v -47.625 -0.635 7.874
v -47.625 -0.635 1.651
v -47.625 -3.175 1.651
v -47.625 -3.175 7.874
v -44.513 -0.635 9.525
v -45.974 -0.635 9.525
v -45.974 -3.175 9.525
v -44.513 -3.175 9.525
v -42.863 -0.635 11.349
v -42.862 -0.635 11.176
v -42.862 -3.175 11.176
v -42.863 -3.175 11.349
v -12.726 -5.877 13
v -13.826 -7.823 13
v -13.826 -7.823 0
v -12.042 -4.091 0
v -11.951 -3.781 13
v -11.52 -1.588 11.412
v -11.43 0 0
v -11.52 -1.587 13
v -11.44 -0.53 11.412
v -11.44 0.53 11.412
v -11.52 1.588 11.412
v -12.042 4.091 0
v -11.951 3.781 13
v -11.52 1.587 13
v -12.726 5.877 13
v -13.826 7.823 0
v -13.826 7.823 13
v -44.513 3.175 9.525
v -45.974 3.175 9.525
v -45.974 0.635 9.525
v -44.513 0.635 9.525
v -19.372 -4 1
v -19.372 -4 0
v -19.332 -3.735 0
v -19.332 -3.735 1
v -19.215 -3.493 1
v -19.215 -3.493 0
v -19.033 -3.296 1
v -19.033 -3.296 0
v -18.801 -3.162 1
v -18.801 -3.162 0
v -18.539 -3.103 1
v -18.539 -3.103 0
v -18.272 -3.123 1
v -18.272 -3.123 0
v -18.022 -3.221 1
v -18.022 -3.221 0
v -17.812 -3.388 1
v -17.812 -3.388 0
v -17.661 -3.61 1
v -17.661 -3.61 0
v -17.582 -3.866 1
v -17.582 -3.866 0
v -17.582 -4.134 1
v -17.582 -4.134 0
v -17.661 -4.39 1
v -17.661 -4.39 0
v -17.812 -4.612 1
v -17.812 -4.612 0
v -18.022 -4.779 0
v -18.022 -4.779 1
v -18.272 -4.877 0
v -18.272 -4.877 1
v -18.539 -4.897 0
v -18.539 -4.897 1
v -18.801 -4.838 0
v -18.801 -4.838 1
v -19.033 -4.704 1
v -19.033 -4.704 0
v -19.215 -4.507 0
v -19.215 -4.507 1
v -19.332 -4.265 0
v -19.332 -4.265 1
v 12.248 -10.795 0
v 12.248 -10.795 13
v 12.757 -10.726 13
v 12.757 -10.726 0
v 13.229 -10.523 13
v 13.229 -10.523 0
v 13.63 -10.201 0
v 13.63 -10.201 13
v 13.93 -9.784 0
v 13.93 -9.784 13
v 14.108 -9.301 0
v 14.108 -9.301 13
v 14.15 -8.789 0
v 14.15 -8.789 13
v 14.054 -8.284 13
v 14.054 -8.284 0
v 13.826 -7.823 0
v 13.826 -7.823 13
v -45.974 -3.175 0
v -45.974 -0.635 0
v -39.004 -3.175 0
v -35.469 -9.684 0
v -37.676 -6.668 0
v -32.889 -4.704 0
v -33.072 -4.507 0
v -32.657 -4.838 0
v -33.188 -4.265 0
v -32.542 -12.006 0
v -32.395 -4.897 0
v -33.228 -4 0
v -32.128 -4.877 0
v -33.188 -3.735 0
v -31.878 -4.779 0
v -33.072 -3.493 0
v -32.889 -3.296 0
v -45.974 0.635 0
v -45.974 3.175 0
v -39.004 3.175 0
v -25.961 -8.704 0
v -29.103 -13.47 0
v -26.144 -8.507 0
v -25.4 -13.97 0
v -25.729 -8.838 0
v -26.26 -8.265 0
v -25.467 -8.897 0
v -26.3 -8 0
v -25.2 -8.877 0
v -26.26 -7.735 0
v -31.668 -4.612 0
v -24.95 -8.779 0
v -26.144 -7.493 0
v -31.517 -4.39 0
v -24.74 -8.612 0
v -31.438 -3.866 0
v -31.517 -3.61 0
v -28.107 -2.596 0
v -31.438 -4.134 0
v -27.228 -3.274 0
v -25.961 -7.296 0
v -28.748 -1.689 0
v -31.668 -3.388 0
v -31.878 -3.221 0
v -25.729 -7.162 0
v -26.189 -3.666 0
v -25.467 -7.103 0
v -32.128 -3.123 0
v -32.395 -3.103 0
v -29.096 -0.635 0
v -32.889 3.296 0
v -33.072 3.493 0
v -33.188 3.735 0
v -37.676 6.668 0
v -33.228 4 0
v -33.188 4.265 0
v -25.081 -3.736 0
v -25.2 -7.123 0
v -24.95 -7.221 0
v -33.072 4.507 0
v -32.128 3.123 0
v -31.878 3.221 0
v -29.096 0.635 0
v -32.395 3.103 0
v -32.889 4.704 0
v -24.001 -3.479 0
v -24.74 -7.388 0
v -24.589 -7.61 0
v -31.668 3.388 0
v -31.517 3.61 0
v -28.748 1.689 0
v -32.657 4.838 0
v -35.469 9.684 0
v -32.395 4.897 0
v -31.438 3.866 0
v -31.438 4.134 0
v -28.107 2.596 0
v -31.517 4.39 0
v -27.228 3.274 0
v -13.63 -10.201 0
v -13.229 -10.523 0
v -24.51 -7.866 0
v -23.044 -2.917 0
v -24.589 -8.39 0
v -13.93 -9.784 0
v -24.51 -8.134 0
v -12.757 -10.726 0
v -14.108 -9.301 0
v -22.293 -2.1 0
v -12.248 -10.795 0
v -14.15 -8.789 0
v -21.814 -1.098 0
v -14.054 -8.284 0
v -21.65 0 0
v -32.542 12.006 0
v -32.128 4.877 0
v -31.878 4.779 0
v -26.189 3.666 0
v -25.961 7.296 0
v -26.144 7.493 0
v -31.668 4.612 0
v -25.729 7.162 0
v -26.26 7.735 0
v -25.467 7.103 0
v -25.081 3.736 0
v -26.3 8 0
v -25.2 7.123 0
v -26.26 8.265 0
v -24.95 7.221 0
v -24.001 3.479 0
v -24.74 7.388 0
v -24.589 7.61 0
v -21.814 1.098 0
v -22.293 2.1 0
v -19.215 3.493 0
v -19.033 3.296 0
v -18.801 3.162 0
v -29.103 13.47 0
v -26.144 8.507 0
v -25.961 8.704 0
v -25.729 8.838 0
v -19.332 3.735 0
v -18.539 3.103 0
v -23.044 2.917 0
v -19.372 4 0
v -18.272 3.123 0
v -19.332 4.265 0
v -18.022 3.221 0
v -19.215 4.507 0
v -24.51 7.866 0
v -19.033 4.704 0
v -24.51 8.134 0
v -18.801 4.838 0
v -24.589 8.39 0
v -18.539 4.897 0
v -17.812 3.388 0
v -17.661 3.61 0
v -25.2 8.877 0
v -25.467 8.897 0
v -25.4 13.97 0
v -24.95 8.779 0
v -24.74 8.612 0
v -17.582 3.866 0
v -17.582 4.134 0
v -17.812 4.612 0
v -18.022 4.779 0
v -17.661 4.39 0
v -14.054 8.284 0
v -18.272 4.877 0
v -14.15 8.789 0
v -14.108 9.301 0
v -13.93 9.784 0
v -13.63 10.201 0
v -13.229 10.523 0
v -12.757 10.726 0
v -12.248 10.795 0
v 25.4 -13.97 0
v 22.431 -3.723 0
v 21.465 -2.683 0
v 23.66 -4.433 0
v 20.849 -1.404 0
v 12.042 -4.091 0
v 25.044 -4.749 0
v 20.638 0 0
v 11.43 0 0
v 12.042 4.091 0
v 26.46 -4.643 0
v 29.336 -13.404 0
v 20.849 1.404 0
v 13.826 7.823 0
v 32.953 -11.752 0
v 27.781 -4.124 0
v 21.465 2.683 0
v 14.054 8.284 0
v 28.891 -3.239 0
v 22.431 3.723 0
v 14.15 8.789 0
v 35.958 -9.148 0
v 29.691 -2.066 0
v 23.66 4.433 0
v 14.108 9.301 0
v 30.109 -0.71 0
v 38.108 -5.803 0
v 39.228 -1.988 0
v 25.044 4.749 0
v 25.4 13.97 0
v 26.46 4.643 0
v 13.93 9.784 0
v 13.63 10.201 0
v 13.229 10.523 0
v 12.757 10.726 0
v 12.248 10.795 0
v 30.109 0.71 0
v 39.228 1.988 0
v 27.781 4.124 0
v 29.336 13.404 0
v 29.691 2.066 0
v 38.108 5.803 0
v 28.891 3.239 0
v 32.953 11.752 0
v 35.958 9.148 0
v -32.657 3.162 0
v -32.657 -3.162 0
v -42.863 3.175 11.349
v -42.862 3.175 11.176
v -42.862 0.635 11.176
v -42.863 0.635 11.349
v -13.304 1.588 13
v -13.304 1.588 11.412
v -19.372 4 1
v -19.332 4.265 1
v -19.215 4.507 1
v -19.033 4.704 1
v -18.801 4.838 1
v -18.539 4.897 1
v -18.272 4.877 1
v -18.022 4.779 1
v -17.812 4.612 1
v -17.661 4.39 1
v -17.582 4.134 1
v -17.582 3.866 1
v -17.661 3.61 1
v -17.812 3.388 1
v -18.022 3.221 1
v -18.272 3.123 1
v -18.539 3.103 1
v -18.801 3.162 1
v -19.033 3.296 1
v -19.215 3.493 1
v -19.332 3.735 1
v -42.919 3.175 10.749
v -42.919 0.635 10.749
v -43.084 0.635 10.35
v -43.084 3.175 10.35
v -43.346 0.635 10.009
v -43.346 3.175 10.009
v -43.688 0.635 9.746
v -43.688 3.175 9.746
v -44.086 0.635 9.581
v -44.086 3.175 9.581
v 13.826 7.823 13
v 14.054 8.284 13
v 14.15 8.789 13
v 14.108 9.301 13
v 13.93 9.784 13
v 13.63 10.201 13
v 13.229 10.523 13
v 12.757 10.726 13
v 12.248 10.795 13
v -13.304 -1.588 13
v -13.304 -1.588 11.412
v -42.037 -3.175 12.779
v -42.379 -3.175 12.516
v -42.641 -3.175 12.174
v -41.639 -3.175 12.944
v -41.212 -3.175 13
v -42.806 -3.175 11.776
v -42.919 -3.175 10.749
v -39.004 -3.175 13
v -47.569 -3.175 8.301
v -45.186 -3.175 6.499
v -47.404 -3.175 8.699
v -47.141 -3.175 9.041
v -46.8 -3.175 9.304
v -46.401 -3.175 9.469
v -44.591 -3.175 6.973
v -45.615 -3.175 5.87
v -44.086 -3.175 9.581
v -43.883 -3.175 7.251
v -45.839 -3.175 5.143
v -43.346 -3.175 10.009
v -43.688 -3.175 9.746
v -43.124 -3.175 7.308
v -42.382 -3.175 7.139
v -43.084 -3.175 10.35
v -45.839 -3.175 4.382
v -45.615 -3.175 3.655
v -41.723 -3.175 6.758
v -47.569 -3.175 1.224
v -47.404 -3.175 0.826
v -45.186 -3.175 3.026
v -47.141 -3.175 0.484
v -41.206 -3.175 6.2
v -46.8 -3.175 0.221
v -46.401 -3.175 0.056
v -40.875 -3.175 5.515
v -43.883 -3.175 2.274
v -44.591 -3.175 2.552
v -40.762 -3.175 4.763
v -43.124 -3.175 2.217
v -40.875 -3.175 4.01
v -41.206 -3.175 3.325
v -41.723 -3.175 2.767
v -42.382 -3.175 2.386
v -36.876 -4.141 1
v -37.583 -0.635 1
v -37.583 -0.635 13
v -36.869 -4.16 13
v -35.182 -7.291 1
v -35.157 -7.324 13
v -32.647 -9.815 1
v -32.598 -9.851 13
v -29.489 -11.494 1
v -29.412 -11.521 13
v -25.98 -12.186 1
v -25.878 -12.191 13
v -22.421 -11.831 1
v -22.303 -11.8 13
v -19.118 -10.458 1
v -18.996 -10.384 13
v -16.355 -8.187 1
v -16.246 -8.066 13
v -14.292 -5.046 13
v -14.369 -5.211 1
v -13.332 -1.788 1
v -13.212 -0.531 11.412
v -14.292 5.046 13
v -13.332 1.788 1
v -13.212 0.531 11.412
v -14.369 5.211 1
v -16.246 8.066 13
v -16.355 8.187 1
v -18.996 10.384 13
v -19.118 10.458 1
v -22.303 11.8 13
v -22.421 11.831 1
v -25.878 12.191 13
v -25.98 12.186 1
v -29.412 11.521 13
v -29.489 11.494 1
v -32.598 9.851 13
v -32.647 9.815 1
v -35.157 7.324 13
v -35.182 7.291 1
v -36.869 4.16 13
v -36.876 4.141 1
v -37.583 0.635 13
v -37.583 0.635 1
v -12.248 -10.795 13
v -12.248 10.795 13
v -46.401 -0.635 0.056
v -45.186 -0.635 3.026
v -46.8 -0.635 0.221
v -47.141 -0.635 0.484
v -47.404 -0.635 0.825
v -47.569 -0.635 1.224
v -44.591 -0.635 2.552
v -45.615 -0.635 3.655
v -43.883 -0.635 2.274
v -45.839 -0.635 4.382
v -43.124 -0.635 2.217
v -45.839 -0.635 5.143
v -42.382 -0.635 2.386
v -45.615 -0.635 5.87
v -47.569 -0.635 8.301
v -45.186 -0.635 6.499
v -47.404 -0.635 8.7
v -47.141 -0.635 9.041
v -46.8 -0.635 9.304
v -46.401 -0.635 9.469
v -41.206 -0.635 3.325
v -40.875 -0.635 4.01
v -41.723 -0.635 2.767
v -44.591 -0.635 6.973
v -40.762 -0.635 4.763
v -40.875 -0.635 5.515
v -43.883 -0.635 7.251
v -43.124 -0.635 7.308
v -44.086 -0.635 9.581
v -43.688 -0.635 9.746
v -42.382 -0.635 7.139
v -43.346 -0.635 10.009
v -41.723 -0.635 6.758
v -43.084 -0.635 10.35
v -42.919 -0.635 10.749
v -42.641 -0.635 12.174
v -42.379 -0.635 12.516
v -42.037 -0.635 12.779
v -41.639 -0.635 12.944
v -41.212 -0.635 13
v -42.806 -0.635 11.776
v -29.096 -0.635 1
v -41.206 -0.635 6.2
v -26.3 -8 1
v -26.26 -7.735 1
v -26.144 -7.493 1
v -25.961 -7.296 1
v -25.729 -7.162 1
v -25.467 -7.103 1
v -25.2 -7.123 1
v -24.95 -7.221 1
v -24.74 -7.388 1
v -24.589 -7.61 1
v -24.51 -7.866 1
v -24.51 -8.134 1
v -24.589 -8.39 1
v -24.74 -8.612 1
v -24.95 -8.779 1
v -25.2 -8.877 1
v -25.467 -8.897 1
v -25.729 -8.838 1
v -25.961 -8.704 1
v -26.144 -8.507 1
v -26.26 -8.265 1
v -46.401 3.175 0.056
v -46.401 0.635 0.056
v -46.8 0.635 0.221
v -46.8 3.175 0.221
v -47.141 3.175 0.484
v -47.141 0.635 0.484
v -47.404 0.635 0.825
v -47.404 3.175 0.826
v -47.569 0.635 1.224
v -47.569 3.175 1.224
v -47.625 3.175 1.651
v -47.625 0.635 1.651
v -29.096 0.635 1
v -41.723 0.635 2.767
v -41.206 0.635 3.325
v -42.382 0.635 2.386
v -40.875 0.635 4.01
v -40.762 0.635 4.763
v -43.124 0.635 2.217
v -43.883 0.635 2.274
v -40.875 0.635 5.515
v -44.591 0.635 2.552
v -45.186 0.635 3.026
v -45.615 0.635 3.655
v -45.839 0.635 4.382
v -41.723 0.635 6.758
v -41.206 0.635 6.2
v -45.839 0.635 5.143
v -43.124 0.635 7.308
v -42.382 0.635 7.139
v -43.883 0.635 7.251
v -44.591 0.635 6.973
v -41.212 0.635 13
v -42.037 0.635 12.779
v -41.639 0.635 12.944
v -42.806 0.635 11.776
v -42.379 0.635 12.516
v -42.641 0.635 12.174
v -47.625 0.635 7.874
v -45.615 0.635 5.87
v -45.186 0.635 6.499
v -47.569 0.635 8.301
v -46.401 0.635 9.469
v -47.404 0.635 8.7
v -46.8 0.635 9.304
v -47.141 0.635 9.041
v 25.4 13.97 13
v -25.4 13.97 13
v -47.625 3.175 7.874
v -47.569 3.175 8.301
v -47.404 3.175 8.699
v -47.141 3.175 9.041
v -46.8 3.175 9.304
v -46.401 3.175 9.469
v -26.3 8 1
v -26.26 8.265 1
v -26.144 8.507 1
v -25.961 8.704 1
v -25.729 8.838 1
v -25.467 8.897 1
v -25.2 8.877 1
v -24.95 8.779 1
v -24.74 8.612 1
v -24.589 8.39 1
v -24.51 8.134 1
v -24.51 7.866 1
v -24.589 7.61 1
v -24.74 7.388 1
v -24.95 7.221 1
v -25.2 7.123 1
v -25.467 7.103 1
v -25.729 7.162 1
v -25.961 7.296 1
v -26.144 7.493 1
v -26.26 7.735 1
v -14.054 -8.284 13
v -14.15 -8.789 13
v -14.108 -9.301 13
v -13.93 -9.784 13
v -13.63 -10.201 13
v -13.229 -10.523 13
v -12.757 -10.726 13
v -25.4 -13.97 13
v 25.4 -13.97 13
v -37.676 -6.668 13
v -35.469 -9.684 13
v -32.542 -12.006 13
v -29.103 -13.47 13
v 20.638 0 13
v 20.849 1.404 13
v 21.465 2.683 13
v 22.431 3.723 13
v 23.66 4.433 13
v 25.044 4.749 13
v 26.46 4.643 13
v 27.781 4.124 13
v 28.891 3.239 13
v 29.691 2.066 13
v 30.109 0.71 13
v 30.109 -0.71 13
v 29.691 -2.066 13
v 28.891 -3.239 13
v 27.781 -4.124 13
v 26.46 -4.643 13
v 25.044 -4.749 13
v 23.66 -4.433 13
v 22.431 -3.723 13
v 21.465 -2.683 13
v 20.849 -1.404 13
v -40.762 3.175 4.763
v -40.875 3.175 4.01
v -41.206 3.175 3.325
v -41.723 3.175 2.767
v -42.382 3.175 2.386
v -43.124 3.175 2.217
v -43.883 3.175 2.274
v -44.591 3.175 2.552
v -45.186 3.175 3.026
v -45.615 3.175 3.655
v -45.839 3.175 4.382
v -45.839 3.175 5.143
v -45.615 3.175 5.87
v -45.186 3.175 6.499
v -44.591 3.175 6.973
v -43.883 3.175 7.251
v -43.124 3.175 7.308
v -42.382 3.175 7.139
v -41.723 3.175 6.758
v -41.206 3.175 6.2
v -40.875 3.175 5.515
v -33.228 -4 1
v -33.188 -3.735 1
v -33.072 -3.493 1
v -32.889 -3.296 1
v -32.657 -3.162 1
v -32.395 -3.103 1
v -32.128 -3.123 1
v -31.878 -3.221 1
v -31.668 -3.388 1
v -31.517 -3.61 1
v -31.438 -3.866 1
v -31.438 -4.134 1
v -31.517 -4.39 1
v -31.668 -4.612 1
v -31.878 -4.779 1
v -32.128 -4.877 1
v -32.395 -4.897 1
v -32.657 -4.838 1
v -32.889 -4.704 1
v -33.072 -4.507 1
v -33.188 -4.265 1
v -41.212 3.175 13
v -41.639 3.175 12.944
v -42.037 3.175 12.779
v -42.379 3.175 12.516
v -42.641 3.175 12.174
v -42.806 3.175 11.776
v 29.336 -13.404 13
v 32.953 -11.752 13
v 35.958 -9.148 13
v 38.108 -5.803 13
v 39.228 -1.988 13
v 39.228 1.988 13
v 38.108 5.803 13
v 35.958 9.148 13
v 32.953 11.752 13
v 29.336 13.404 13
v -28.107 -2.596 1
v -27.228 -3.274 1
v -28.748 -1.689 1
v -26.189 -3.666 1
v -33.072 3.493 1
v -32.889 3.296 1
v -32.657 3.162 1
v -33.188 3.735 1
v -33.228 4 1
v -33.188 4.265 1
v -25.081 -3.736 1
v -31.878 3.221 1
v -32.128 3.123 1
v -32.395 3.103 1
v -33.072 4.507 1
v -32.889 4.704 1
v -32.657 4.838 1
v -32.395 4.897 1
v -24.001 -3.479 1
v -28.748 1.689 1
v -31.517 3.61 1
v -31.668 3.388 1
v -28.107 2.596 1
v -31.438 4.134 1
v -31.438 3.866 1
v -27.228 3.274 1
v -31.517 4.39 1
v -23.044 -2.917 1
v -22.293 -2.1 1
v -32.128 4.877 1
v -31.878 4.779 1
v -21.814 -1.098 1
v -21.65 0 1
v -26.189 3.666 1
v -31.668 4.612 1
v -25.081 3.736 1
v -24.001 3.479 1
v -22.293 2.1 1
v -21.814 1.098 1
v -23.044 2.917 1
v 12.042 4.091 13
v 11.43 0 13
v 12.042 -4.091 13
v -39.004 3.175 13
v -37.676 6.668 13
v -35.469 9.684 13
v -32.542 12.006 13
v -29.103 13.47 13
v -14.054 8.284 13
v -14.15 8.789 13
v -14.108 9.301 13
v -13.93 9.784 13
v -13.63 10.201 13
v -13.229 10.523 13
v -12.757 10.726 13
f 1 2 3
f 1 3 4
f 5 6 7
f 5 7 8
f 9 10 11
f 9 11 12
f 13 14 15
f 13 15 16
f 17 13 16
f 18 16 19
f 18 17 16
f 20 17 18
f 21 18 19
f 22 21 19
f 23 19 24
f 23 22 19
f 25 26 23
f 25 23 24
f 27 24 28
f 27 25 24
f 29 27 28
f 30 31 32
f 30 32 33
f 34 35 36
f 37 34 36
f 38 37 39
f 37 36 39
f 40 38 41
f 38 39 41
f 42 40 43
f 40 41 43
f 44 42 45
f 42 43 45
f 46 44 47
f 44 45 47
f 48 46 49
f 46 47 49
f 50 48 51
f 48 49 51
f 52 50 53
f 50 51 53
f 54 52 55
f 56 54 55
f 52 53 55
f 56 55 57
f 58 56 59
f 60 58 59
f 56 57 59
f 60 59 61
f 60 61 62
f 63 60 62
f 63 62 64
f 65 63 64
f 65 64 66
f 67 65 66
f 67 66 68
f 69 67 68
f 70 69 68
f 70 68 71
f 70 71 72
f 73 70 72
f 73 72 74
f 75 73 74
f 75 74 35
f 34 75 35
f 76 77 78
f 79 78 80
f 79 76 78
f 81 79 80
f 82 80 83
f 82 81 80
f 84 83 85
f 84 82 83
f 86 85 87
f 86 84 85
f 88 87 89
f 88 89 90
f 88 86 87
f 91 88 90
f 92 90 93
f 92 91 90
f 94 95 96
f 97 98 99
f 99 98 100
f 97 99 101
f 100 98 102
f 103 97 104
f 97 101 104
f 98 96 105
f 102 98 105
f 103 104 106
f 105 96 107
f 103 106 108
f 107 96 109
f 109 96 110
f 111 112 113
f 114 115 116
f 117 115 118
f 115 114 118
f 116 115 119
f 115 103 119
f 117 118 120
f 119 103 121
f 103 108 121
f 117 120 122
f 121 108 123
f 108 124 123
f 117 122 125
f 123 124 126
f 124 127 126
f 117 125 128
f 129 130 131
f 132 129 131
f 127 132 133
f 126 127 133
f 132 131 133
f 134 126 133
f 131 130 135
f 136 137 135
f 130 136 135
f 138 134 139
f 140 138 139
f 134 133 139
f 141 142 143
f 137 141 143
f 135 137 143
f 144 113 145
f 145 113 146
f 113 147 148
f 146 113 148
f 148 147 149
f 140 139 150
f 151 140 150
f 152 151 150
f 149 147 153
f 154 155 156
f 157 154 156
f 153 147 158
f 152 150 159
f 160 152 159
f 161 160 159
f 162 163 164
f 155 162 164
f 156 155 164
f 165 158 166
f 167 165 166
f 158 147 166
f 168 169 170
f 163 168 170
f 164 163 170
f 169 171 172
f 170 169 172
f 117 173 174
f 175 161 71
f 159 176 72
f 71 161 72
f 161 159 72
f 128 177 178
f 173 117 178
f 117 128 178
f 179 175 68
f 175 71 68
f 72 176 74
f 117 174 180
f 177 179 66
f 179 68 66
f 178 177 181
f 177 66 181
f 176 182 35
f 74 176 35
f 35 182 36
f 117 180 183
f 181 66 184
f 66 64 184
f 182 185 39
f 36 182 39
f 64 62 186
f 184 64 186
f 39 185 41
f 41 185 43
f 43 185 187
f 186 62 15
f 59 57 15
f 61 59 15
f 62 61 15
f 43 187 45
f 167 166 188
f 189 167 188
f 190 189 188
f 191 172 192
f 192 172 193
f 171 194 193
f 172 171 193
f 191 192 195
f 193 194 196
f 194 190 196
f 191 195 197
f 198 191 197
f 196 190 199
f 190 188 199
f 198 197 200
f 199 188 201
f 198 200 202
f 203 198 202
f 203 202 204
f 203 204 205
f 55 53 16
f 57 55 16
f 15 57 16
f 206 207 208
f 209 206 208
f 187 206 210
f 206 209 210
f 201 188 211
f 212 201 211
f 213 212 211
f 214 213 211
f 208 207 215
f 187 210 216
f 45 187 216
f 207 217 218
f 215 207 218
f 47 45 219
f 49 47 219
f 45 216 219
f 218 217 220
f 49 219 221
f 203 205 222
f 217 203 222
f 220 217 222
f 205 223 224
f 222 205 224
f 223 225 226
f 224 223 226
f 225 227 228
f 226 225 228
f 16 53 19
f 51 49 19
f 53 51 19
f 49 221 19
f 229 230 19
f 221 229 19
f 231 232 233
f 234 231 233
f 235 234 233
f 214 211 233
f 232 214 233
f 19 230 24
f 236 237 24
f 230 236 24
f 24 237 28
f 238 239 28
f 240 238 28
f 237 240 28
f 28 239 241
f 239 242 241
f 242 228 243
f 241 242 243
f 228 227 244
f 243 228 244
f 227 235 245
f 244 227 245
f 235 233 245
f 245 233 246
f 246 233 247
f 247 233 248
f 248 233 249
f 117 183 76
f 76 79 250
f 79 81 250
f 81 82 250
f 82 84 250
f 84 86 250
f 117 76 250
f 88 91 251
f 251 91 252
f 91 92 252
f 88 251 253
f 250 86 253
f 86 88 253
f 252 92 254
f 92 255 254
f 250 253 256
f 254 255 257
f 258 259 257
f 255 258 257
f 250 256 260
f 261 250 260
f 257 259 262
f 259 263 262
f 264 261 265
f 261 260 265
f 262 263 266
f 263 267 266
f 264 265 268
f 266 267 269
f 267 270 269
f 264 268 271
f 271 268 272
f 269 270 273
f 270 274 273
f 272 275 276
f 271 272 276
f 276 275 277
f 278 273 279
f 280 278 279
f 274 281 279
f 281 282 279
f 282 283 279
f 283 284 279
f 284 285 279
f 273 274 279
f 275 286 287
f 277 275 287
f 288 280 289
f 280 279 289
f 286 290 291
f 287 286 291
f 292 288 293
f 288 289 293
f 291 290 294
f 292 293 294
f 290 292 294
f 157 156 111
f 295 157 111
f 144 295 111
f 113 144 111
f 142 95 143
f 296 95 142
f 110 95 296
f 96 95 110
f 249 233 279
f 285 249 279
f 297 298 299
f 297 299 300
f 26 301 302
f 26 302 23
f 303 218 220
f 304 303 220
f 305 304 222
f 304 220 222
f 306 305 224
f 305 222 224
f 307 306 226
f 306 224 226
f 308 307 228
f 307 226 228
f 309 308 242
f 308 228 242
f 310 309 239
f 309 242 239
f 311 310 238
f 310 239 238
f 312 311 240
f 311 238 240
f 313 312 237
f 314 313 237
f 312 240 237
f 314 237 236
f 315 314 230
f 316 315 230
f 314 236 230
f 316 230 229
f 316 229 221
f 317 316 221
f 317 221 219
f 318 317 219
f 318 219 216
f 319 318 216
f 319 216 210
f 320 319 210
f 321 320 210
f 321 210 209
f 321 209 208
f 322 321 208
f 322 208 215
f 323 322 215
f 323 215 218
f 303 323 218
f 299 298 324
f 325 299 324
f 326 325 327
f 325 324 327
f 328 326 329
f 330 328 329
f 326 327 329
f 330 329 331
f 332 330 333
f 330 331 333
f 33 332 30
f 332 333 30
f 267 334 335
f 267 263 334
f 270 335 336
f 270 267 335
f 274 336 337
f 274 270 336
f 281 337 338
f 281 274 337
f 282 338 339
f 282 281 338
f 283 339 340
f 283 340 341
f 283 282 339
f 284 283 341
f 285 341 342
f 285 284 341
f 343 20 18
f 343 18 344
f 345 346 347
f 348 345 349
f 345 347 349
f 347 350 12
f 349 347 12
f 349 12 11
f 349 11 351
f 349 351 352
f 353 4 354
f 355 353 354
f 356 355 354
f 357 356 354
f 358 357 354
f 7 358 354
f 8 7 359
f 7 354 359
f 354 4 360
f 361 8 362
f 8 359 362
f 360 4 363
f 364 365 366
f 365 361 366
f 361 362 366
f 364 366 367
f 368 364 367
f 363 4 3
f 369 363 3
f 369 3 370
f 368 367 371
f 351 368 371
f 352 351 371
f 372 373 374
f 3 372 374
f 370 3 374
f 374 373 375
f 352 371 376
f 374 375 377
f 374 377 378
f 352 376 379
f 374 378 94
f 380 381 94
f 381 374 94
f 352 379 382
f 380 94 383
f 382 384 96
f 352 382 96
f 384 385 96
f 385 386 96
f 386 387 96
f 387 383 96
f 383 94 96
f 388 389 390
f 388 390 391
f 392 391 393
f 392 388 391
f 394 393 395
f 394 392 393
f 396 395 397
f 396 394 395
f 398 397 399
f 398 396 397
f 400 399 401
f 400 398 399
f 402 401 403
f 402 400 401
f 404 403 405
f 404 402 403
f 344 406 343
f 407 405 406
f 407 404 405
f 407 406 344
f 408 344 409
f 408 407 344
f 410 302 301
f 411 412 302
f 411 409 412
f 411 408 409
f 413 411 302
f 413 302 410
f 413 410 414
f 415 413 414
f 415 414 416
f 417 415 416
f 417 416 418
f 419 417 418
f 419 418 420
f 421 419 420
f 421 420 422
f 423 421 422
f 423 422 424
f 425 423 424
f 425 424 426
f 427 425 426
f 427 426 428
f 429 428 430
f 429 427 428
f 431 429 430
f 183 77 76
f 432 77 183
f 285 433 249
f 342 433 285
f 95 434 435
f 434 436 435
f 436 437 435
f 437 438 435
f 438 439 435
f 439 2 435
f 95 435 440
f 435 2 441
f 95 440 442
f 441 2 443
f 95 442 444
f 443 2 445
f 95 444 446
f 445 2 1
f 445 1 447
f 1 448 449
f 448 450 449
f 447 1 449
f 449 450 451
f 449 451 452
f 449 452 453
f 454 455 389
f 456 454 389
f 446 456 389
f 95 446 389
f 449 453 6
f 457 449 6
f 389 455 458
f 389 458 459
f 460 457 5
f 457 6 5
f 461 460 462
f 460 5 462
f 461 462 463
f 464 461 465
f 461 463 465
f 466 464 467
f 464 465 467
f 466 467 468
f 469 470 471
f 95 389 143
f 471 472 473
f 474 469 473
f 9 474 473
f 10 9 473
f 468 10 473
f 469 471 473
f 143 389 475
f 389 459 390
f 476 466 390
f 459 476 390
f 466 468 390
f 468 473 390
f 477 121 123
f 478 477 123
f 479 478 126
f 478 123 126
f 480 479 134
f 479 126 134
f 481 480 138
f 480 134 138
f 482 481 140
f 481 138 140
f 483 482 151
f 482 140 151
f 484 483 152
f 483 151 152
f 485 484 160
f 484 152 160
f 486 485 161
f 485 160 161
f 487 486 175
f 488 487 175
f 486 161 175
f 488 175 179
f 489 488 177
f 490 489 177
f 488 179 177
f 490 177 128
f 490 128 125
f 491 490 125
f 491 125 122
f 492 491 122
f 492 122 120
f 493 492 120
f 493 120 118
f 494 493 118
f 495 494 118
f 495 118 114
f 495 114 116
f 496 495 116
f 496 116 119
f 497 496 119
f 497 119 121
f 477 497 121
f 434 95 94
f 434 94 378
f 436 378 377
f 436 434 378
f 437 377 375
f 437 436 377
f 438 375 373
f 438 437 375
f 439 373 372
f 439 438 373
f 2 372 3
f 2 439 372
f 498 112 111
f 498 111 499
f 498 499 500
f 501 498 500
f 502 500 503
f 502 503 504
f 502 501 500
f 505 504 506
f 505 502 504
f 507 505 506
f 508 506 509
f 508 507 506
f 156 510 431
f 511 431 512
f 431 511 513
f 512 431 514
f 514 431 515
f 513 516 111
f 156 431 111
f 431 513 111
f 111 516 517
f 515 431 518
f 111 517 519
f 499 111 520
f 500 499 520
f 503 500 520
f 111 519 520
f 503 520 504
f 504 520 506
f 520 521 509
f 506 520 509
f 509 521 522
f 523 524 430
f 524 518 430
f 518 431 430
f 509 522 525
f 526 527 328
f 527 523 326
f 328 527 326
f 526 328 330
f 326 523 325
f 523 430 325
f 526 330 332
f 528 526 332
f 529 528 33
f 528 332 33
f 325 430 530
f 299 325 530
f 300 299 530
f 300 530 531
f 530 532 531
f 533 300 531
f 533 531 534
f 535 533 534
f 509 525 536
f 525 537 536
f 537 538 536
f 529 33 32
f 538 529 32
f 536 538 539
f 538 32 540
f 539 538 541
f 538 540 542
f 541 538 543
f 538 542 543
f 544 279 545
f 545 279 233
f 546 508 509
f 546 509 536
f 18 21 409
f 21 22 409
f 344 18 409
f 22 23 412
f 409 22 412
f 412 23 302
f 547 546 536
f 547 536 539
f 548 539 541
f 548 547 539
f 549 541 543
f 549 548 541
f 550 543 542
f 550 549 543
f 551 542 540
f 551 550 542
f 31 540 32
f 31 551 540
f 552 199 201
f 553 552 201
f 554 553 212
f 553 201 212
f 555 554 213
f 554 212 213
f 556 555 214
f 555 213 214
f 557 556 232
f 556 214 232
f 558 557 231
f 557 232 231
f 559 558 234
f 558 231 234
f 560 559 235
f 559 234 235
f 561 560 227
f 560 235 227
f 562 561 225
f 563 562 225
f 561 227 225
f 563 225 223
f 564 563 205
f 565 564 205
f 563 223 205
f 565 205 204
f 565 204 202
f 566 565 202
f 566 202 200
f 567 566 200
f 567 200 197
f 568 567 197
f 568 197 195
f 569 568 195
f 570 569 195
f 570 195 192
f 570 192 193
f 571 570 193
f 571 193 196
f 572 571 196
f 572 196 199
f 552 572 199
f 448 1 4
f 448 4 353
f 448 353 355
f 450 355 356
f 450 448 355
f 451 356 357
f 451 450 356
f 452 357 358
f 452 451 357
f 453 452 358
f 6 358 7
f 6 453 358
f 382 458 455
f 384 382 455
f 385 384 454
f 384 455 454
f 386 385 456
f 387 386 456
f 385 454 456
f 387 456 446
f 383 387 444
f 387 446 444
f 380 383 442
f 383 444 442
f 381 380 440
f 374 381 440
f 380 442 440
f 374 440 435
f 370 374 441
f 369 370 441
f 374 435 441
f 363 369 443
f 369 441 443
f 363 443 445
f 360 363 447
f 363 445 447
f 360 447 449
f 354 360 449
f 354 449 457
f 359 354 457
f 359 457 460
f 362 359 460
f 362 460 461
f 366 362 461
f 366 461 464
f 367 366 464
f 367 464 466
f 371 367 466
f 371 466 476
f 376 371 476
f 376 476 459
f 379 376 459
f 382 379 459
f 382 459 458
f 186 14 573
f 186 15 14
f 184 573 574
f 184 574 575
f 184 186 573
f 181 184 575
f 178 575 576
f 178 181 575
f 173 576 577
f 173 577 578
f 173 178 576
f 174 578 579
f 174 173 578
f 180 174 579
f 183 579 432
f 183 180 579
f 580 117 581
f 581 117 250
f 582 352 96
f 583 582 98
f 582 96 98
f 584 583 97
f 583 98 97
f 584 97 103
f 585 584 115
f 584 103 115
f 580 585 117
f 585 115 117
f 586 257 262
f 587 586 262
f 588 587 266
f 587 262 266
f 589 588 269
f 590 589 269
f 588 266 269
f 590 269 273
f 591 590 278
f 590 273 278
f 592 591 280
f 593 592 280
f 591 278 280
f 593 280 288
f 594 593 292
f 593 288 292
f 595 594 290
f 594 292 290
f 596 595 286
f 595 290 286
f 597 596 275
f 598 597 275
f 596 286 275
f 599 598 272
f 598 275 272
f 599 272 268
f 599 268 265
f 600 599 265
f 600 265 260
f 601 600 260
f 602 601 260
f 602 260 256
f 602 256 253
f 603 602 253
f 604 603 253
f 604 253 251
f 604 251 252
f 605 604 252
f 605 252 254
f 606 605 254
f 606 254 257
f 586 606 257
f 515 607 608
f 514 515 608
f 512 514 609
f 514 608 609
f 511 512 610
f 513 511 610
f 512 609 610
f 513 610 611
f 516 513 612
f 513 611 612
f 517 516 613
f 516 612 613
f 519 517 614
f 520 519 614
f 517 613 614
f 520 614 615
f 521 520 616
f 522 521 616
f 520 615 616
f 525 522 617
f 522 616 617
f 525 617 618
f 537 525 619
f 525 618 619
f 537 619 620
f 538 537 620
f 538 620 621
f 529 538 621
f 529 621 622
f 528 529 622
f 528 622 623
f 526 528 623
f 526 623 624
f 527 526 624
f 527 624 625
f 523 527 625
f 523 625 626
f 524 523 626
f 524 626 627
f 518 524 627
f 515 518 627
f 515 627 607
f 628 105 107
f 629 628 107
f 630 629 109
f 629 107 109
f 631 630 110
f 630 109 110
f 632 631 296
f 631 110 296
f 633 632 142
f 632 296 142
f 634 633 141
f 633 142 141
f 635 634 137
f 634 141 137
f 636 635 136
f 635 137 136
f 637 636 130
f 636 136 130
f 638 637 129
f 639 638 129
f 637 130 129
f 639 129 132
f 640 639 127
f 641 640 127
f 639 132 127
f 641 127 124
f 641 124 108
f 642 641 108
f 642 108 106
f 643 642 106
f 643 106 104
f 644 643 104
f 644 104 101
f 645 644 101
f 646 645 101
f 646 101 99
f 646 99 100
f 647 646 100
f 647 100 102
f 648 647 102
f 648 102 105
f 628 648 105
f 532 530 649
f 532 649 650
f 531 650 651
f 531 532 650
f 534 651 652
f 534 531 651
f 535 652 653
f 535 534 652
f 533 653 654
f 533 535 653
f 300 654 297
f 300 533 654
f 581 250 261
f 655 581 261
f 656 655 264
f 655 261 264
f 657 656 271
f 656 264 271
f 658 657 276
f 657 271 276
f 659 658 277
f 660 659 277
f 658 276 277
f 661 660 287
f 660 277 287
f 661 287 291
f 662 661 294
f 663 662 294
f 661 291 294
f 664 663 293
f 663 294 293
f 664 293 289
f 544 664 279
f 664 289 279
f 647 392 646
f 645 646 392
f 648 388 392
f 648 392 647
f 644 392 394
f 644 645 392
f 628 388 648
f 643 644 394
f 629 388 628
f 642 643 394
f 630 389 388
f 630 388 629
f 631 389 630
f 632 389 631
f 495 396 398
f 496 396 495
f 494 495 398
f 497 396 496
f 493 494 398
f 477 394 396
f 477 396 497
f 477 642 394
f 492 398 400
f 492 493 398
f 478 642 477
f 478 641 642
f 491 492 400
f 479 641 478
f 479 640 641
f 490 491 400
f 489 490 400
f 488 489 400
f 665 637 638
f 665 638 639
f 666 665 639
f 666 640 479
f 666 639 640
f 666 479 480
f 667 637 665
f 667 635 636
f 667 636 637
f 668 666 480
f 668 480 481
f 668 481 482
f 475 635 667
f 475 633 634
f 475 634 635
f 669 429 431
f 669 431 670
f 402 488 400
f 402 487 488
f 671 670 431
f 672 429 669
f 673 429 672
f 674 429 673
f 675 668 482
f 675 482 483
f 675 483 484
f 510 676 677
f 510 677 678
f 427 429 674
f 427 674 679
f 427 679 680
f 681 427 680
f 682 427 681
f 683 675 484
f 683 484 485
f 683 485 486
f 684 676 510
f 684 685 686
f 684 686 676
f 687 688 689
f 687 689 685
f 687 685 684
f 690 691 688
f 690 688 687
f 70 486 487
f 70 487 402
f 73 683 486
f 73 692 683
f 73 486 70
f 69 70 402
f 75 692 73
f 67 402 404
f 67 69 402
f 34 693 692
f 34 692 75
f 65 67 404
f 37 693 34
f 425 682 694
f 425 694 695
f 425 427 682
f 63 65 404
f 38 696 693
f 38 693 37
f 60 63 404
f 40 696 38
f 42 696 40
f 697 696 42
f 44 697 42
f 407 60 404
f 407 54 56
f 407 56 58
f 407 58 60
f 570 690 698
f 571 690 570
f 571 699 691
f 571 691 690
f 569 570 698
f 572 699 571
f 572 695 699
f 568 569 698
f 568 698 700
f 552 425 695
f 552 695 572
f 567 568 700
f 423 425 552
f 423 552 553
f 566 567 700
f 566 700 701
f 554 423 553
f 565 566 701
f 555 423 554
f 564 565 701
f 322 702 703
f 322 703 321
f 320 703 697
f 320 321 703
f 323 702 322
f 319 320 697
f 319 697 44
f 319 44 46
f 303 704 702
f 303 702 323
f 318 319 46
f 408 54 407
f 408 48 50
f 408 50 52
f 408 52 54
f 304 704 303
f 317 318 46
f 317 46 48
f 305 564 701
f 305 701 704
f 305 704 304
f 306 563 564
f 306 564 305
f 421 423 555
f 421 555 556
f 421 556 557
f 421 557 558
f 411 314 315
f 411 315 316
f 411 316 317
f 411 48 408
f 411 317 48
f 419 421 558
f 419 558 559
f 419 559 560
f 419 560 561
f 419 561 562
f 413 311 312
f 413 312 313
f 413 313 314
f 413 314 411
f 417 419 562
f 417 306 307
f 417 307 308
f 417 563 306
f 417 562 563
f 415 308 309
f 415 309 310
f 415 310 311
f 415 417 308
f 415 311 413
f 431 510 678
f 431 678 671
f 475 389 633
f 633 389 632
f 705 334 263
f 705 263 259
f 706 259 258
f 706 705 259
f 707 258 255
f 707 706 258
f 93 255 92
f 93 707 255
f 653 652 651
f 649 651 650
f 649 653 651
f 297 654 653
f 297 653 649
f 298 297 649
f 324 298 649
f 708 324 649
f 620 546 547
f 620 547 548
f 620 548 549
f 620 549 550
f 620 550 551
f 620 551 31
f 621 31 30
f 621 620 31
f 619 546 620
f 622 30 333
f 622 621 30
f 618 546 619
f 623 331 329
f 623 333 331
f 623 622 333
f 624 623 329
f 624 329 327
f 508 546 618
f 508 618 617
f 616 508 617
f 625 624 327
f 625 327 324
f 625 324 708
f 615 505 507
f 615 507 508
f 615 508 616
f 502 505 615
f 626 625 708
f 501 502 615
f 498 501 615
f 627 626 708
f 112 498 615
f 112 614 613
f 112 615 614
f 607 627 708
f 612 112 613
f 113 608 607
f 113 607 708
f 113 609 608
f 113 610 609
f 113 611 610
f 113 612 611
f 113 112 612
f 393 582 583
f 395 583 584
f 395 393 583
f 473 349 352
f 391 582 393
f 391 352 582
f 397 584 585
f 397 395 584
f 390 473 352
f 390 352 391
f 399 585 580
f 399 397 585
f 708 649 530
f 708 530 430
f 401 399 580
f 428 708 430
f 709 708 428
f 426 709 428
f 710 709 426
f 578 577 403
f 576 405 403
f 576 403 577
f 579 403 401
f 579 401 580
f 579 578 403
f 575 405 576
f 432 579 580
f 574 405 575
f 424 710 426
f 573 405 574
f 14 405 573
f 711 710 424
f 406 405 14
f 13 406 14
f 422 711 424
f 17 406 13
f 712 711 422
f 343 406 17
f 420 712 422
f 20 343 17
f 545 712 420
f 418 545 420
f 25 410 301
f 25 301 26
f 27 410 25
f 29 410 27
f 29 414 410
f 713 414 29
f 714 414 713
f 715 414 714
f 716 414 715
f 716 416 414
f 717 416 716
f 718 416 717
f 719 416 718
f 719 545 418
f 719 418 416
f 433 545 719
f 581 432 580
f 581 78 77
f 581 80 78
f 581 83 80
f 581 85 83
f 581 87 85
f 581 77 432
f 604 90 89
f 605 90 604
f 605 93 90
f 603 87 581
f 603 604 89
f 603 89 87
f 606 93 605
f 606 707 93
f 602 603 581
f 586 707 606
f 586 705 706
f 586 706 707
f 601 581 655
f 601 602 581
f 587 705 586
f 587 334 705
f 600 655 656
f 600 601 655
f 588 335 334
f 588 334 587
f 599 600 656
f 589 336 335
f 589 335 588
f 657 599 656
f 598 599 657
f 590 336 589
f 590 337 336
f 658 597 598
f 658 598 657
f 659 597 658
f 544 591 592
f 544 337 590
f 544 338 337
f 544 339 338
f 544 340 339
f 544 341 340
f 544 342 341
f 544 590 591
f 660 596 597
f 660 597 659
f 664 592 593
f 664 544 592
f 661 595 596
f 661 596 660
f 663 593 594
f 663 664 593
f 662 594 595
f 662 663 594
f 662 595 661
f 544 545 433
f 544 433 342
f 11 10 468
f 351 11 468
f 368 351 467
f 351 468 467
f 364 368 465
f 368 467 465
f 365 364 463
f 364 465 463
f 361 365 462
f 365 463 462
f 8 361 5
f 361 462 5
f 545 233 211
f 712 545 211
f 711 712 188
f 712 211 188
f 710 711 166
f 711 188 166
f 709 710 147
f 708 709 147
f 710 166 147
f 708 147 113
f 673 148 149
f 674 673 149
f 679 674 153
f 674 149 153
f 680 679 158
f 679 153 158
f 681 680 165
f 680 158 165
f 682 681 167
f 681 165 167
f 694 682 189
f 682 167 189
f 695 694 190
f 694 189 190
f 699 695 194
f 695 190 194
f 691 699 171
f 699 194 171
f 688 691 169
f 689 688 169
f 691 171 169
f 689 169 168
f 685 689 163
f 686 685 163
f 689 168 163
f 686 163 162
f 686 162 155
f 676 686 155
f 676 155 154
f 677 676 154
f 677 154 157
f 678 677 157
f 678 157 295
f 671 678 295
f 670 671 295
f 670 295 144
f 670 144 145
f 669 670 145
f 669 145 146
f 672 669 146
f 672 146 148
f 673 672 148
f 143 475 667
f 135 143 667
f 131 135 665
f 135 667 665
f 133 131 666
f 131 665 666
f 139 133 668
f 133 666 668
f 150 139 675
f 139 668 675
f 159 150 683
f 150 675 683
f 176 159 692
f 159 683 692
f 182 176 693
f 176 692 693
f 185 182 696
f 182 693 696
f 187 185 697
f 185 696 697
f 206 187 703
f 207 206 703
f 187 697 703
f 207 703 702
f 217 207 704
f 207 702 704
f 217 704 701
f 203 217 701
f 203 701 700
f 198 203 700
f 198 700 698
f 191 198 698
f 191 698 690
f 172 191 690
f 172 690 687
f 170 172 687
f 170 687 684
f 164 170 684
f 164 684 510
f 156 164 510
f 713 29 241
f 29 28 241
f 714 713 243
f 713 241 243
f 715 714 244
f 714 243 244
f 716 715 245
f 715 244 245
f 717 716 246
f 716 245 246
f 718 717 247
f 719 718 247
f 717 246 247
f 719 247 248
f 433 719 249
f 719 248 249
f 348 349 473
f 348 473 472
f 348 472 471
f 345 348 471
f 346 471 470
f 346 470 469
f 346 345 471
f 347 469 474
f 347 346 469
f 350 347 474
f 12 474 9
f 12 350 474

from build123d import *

# Parameters (mm, degrees)
BOSS_EXTRUDE1_DEPTH          = 13
M1_6_CLEARANCE_HOLE2_D       = 1.8
F_3_8_0_375_DIAMETER_HOLE1_D = 9.525
CUT_EXTRUDE1_START           = 1
SKETCH1_4_R                  = 12.2
CUT_EXTRUDE1_DEPTH           = 43.751089129
BOSS_EXTRUDE2_DEPTH          = 3.175
F_10_CLEARANCE_HOLE1_D       = 5.1054
FILLET1_R                    = 1.651
CUT_EXTRUDE2_DEPTH           = 52.305959936
CUT_EXTRUDE3_DEPTH           = 52.305959936
FILLET2_R                    = 1.905
CUT_EXTRUDE4_DEPTH           = 1.5875


with BuildPart() as part:
    # Sketch1 → Boss-Extrude1 (new body)
    with BuildSketch(Plane.XY):
        with BuildLine():
            Line((-25.4, -13.97), (25.4, -13.97))
            ThreePointArc((25.4, -13.97), (39.37, 0), (25.4, 13.97))
            Line((25.4, 13.97), (-25.4, 13.97))
            ThreePointArc((-25.4, 13.97), (-39.37, 0), (-25.4, -13.97))
        make_face()
    extrude(amount=BOSS_EXTRUDE1_DEPTH)

    # M1.6 Clearance Hole2 (through all)
    with Locations(Plane.XY.offset(13)):
        with Locations((-32.32820323, 4), (-25.4, 8), (-18.47179677, 4), (-18.47179677, -4), (-25.4, -8), (-32.32820323, -4)):
            Hole(M1_6_CLEARANCE_HOLE2_D / 2)

    # 3/8 (0.375) Diameter Hole1 (through all)
    with Locations(Plane.XY.offset(13)):
        with Locations((25.4, 0)):
            Hole(F_3_8_0_375_DIAMETER_HOLE1_D / 2)

    # Sketch1<4> → Cut-Extrude1 (cut, through all)
    with BuildSketch(Plane.XY.offset(CUT_EXTRUDE1_START)):
        with Locations((-25.4, 0)):
            Circle(SKETCH1_4_R)
    extrude(amount=CUT_EXTRUDE1_DEPTH, mode=Mode.SUBTRACT)

    # Sketch7 → Boss-Extrude2 (add, symmetric)
    with BuildSketch(Plane(origin=(0, 0, 0), x_dir=(1, 0, 0), z_dir=(0, 1, 0))):
        Polygon((-38.1, 0), (-47.625, 0), (-47.625, -9.525), (-42.8625, -9.525), (-42.8625, -13), (-38.1, -13), align=None)
    extrude(amount=BOSS_EXTRUDE2_DEPTH, both=True)

    # #10 Clearance Hole1 (through all)
    with Locations(Plane(origin=(0, -3.175, 0), x_dir=(-1, 0, 0), z_dir=(0, -1, 0))):
        with Locations((43.314710578, -4.7625)):
            Hole(F_10_CLEARANCE_HOLE1_D / 2)

    # Fillet1
    fillet1_edges = [part.edges().sort_by_distance(p)[0] for p in [
        (-47.625, 0, 0),
        (-42.8625, 0, 13),
        (-42.8625, 0, 9.525),
        (-47.625, 0, 9.525),
    ]]
    fillet(fillet1_edges, radius=FILLET1_R)

    # Sketch9 → Cut-Extrude2 (cut, through all)
    with BuildSketch(Plane.XY.offset(13)):
        with BuildLine():
            Line((-47.625, 0.635), (-47.625, -0.635))
            Line((-47.625, -0.635), (-29.095845641, -0.635))
            ThreePointArc((-29.095845641, -0.635), (-21.65, 0), (-29.095845641, 0.635))
            Line((-29.095845641, 0.635), (-47.625, 0.635))
        make_face()
    extrude(amount=-CUT_EXTRUDE2_DEPTH, mode=Mode.SUBTRACT)

    # Sketch13 → Cut-Extrude3 (cut, through all)
    with BuildSketch(Plane.XY.offset(13)):
        with BuildLine():
            Line((-16.532707572, 10.795), (16.532707572, 10.795))
            ThreePointArc((16.532707572, 10.795), (11.43, 0), (16.532707572, -10.795))
            Line((16.532707572, -10.795), (-16.532707572, -10.795))
            ThreePointArc((-16.532707572, -10.795), (-11.43, 0), (-16.532707572, 10.795))
        make_face()
    extrude(amount=-CUT_EXTRUDE3_DEPTH, mode=Mode.SUBTRACT)

    # Fillet2
    fillet2_edges = [part.edges().sort_by_distance(p)[0] for p in [
        (16.532707572, -10.795, 6.5),
        (16.532707572, 10.795, 6.5),
        (-16.532707572, 10.795, 6.5),
        (-16.532707572, -10.795, 6.5),
    ]]
    fillet(fillet2_edges, radius=FILLET2_R)

    # Sketch14 → Cut-Extrude4 (cut)
    with BuildSketch(Plane.XY.offset(13)):
        with BuildLine():
            Line((-25.4, 1.5875), (0, 1.5875))
            ThreePointArc((0, 1.5875), (1.5875, 0), (0, -1.5875))
            Line((0, -1.5875), (-25.4, -1.5875))
            ThreePointArc((-25.4, -1.5875), (-26.9875, 0), (-25.4, 1.5875))
        make_face()
    extrude(amount=-CUT_EXTRUDE4_DEPTH, mode=Mode.SUBTRACT)


solid = part.part
